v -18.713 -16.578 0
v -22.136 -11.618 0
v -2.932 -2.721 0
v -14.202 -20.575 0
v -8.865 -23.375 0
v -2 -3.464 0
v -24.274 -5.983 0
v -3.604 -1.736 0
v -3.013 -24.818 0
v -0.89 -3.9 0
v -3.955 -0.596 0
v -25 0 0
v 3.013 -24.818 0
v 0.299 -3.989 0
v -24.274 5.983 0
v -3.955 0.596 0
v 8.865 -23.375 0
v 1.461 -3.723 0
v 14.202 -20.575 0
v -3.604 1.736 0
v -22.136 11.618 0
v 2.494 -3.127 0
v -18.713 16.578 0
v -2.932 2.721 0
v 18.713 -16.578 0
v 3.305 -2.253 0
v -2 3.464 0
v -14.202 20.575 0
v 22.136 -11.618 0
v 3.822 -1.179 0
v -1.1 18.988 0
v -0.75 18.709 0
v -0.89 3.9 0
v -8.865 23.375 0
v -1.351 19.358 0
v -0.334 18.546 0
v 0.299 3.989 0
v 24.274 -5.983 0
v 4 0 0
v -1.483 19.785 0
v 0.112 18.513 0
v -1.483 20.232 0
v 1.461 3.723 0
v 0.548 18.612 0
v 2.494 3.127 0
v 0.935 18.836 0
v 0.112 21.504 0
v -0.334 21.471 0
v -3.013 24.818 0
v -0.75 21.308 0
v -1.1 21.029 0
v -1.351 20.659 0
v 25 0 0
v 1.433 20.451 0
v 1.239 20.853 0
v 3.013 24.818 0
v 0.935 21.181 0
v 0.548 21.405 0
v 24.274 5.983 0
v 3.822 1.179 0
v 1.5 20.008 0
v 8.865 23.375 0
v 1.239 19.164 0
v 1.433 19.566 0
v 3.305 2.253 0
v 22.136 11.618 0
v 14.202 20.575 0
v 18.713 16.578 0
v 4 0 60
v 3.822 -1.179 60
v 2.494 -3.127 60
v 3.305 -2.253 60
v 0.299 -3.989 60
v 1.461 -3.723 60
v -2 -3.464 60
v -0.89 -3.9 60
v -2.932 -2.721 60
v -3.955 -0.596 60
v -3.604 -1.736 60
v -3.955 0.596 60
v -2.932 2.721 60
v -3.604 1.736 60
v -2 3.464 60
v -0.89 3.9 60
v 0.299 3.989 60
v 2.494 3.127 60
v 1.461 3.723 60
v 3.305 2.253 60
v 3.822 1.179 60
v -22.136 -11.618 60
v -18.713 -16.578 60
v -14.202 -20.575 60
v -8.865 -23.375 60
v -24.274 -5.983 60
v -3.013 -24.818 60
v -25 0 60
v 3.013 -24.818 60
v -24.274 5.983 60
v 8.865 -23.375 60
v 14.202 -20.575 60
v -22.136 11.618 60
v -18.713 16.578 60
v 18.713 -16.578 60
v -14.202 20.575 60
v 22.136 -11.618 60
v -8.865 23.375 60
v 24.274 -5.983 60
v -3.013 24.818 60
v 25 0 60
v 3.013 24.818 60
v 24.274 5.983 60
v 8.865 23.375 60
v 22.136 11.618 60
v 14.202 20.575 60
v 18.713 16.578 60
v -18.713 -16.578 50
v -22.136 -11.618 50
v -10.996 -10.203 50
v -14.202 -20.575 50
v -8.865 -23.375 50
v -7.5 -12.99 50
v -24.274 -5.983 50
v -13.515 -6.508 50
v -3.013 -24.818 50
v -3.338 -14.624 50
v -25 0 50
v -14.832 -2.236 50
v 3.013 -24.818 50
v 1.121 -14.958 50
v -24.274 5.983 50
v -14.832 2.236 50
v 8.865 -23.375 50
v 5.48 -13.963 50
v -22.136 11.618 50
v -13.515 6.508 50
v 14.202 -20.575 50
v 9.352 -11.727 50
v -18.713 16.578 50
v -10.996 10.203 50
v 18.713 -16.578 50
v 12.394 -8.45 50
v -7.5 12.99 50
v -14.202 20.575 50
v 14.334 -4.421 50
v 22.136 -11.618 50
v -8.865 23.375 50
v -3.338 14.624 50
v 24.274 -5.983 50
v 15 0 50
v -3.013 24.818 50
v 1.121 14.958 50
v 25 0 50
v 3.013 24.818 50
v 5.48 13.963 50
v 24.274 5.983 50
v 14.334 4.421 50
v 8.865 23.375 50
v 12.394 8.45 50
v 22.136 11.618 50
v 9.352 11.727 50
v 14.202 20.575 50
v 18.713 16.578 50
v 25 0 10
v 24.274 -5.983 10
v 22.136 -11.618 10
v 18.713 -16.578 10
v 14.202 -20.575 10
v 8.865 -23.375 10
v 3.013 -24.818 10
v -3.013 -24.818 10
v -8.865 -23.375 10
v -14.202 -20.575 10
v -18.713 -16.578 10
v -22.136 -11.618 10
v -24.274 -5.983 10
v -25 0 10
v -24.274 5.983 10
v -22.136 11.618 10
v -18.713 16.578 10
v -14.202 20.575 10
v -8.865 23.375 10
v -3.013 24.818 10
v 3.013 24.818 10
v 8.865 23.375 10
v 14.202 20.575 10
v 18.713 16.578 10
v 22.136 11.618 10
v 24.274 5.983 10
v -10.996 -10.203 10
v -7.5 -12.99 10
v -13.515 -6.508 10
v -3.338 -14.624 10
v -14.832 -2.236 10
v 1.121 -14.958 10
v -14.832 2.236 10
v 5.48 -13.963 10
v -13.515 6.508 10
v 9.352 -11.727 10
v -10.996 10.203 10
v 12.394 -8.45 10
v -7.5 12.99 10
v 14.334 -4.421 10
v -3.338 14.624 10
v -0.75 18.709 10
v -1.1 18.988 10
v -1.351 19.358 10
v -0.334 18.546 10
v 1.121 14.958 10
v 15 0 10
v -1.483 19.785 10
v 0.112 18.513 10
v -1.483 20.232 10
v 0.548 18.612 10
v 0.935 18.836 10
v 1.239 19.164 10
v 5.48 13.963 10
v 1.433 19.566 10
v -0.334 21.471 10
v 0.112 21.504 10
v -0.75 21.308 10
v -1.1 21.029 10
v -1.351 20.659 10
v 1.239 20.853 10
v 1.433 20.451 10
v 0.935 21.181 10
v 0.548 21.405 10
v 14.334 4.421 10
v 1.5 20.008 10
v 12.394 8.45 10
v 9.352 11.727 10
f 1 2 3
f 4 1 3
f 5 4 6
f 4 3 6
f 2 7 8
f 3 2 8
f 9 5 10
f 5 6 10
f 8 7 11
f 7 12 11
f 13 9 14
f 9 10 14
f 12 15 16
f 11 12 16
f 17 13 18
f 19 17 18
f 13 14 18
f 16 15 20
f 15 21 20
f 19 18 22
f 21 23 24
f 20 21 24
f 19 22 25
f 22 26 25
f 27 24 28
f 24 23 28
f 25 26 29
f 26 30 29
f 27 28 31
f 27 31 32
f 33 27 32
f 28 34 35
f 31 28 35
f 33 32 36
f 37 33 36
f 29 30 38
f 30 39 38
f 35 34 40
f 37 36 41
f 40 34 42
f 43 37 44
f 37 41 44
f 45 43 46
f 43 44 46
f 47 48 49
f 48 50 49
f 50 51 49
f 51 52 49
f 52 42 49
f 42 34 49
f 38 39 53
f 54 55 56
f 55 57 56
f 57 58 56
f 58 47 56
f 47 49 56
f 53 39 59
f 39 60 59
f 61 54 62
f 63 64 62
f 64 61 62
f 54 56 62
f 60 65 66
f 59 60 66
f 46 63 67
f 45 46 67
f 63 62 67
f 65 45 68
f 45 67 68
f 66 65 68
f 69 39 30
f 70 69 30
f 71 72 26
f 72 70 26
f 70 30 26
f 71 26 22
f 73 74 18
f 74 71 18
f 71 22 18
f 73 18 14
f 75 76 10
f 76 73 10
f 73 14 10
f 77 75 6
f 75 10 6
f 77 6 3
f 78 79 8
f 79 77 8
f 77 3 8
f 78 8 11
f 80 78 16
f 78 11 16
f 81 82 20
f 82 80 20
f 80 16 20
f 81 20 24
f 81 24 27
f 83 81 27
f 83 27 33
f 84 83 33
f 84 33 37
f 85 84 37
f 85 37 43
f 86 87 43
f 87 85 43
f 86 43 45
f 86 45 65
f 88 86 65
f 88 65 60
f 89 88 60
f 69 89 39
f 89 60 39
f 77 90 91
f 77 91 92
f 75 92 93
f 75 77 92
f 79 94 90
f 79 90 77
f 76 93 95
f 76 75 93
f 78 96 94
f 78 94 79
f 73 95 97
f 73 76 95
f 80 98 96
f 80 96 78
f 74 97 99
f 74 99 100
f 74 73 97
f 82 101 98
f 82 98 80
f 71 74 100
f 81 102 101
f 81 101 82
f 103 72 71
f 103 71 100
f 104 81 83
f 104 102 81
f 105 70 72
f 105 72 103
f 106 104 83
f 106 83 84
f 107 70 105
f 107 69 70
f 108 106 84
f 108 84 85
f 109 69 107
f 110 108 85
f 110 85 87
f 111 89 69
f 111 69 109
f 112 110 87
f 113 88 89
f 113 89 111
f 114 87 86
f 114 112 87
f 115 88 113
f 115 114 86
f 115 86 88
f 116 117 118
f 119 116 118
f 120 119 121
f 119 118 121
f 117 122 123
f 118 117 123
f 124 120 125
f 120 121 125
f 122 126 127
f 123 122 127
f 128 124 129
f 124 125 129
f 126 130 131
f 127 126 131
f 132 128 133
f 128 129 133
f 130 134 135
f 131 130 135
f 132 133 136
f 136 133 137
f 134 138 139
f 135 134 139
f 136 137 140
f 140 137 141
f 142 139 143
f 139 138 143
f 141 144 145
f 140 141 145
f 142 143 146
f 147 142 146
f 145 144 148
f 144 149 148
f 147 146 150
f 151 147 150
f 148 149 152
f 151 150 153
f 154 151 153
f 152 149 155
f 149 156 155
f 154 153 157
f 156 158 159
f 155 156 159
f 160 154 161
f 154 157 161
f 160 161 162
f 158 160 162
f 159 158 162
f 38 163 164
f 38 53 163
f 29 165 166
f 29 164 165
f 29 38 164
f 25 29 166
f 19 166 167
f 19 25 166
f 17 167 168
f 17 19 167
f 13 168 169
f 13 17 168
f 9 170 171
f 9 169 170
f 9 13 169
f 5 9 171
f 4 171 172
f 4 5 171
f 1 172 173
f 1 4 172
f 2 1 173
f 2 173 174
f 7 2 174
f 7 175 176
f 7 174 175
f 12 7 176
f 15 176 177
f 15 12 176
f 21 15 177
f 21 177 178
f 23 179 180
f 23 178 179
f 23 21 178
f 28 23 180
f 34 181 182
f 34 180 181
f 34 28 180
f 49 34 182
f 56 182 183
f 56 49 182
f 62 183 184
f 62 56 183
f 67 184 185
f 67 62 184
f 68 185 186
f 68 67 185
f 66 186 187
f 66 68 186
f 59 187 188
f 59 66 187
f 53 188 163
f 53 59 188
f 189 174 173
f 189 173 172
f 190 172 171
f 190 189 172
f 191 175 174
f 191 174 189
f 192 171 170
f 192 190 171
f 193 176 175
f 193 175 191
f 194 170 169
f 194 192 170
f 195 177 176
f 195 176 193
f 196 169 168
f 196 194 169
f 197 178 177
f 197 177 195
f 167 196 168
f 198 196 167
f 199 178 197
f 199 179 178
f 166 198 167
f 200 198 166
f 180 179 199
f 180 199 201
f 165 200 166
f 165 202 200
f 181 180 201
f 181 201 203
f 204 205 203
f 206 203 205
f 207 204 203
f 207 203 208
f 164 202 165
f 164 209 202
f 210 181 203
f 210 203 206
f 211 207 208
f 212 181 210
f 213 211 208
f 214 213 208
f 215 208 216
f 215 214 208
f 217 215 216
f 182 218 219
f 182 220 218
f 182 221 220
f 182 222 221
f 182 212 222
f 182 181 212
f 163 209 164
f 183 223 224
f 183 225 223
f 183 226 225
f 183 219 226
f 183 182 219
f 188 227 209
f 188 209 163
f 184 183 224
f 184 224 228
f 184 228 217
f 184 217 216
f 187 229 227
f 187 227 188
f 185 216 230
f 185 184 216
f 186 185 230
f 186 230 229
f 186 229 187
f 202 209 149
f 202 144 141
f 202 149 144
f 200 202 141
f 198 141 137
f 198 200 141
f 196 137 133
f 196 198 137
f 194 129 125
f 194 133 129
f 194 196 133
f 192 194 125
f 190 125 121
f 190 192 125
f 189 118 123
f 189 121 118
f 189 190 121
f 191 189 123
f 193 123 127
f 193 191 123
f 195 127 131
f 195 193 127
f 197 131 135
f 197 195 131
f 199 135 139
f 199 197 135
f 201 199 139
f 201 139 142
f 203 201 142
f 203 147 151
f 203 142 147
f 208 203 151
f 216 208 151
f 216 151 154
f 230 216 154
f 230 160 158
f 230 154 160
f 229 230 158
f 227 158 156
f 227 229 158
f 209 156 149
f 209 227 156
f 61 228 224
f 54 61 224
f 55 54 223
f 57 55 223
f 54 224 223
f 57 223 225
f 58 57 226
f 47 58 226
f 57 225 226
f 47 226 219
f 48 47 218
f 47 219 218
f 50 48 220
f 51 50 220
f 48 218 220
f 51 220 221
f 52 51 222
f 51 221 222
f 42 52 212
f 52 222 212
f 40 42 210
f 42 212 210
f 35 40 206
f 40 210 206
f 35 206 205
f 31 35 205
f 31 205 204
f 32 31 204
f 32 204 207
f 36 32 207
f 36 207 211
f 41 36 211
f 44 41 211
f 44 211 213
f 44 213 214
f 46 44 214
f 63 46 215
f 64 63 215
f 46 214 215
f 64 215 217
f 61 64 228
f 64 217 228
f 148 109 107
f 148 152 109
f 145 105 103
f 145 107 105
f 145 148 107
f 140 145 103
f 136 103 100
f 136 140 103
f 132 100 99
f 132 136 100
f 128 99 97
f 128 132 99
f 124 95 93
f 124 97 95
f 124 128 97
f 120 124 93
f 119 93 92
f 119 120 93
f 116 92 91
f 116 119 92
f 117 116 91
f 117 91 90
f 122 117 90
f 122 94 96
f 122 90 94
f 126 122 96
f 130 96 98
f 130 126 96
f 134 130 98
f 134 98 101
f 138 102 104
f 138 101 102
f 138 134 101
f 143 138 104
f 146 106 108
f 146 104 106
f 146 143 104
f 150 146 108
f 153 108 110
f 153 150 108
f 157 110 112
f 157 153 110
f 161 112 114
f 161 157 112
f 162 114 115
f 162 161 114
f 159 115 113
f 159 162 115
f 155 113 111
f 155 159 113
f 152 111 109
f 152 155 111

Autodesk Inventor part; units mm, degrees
ref_plane "YZ Plane" through (0, 0, 0) normal (1, 0, 0) x (0, 1, 0)
ref_plane "XZ Plane" through (0, 0, 0) normal (0, 1, 0) x (-1, 0, 0)
ref_plane "XY Plane" through (0, 0, 0) normal (0, 0, 1) x (1, 0, 0)
sketch "Boceto1" plane through (0, 0, 0) normal (0, 0, 1) x (1, 0, 0)
  circle A0 centre (0, 0) radius 25
  circle A1 centre (0, 0) radius 4
  circle A2 centre (0, 0) radius 11
  dimension "d0" = 50
  dimension "d3" = 8
  dimension "d34" = 22
extrude "Extrusión1" add sketch "Boceto1" along normal blind 10 contours A0 | A2
sketch "Boceto5" plane through (0, 0, 10) normal (0, 0, 1) x (1, 0, 0)
  circle A0 centre (0, 0) radius 4
  circle A1 centre (0, 0) radius 15
  dimension "d15" = 8
  dimension "d16" = 30
extrude "Extrusión5" add sketch "Boceto5" along normal blind 40
sketch "Boceto6" plane through (0, 0, 50) normal (0, 0, 1) x (1, 0, 0)
  circle A0 centre (0, 0) radius 4 projected
  circle A1 centre (0, 0) radius 25
  circle A2 centre (0, 0) radius 4
  circle A3 centre (0, 0) radius 11
  dimension "d22" = 50
  dimension "d30" = 8
  dimension "d31" = 22
extrude "Extrusión13" add sketch "Boceto6" along normal blind 10 contours A1 | A3
sketch "Boceto17" plane through (0, 0, 10) normal (0, 0, 1) x (1, 0, 0)
  circle A0 centre (0, 20.0085) radius 1.5
  point P0 (0, 0)
  dimension "d102" = 3
extrude "Extrusión14" cut sketch "Boceto17" against normal blind 10
properties part number "carrete"
